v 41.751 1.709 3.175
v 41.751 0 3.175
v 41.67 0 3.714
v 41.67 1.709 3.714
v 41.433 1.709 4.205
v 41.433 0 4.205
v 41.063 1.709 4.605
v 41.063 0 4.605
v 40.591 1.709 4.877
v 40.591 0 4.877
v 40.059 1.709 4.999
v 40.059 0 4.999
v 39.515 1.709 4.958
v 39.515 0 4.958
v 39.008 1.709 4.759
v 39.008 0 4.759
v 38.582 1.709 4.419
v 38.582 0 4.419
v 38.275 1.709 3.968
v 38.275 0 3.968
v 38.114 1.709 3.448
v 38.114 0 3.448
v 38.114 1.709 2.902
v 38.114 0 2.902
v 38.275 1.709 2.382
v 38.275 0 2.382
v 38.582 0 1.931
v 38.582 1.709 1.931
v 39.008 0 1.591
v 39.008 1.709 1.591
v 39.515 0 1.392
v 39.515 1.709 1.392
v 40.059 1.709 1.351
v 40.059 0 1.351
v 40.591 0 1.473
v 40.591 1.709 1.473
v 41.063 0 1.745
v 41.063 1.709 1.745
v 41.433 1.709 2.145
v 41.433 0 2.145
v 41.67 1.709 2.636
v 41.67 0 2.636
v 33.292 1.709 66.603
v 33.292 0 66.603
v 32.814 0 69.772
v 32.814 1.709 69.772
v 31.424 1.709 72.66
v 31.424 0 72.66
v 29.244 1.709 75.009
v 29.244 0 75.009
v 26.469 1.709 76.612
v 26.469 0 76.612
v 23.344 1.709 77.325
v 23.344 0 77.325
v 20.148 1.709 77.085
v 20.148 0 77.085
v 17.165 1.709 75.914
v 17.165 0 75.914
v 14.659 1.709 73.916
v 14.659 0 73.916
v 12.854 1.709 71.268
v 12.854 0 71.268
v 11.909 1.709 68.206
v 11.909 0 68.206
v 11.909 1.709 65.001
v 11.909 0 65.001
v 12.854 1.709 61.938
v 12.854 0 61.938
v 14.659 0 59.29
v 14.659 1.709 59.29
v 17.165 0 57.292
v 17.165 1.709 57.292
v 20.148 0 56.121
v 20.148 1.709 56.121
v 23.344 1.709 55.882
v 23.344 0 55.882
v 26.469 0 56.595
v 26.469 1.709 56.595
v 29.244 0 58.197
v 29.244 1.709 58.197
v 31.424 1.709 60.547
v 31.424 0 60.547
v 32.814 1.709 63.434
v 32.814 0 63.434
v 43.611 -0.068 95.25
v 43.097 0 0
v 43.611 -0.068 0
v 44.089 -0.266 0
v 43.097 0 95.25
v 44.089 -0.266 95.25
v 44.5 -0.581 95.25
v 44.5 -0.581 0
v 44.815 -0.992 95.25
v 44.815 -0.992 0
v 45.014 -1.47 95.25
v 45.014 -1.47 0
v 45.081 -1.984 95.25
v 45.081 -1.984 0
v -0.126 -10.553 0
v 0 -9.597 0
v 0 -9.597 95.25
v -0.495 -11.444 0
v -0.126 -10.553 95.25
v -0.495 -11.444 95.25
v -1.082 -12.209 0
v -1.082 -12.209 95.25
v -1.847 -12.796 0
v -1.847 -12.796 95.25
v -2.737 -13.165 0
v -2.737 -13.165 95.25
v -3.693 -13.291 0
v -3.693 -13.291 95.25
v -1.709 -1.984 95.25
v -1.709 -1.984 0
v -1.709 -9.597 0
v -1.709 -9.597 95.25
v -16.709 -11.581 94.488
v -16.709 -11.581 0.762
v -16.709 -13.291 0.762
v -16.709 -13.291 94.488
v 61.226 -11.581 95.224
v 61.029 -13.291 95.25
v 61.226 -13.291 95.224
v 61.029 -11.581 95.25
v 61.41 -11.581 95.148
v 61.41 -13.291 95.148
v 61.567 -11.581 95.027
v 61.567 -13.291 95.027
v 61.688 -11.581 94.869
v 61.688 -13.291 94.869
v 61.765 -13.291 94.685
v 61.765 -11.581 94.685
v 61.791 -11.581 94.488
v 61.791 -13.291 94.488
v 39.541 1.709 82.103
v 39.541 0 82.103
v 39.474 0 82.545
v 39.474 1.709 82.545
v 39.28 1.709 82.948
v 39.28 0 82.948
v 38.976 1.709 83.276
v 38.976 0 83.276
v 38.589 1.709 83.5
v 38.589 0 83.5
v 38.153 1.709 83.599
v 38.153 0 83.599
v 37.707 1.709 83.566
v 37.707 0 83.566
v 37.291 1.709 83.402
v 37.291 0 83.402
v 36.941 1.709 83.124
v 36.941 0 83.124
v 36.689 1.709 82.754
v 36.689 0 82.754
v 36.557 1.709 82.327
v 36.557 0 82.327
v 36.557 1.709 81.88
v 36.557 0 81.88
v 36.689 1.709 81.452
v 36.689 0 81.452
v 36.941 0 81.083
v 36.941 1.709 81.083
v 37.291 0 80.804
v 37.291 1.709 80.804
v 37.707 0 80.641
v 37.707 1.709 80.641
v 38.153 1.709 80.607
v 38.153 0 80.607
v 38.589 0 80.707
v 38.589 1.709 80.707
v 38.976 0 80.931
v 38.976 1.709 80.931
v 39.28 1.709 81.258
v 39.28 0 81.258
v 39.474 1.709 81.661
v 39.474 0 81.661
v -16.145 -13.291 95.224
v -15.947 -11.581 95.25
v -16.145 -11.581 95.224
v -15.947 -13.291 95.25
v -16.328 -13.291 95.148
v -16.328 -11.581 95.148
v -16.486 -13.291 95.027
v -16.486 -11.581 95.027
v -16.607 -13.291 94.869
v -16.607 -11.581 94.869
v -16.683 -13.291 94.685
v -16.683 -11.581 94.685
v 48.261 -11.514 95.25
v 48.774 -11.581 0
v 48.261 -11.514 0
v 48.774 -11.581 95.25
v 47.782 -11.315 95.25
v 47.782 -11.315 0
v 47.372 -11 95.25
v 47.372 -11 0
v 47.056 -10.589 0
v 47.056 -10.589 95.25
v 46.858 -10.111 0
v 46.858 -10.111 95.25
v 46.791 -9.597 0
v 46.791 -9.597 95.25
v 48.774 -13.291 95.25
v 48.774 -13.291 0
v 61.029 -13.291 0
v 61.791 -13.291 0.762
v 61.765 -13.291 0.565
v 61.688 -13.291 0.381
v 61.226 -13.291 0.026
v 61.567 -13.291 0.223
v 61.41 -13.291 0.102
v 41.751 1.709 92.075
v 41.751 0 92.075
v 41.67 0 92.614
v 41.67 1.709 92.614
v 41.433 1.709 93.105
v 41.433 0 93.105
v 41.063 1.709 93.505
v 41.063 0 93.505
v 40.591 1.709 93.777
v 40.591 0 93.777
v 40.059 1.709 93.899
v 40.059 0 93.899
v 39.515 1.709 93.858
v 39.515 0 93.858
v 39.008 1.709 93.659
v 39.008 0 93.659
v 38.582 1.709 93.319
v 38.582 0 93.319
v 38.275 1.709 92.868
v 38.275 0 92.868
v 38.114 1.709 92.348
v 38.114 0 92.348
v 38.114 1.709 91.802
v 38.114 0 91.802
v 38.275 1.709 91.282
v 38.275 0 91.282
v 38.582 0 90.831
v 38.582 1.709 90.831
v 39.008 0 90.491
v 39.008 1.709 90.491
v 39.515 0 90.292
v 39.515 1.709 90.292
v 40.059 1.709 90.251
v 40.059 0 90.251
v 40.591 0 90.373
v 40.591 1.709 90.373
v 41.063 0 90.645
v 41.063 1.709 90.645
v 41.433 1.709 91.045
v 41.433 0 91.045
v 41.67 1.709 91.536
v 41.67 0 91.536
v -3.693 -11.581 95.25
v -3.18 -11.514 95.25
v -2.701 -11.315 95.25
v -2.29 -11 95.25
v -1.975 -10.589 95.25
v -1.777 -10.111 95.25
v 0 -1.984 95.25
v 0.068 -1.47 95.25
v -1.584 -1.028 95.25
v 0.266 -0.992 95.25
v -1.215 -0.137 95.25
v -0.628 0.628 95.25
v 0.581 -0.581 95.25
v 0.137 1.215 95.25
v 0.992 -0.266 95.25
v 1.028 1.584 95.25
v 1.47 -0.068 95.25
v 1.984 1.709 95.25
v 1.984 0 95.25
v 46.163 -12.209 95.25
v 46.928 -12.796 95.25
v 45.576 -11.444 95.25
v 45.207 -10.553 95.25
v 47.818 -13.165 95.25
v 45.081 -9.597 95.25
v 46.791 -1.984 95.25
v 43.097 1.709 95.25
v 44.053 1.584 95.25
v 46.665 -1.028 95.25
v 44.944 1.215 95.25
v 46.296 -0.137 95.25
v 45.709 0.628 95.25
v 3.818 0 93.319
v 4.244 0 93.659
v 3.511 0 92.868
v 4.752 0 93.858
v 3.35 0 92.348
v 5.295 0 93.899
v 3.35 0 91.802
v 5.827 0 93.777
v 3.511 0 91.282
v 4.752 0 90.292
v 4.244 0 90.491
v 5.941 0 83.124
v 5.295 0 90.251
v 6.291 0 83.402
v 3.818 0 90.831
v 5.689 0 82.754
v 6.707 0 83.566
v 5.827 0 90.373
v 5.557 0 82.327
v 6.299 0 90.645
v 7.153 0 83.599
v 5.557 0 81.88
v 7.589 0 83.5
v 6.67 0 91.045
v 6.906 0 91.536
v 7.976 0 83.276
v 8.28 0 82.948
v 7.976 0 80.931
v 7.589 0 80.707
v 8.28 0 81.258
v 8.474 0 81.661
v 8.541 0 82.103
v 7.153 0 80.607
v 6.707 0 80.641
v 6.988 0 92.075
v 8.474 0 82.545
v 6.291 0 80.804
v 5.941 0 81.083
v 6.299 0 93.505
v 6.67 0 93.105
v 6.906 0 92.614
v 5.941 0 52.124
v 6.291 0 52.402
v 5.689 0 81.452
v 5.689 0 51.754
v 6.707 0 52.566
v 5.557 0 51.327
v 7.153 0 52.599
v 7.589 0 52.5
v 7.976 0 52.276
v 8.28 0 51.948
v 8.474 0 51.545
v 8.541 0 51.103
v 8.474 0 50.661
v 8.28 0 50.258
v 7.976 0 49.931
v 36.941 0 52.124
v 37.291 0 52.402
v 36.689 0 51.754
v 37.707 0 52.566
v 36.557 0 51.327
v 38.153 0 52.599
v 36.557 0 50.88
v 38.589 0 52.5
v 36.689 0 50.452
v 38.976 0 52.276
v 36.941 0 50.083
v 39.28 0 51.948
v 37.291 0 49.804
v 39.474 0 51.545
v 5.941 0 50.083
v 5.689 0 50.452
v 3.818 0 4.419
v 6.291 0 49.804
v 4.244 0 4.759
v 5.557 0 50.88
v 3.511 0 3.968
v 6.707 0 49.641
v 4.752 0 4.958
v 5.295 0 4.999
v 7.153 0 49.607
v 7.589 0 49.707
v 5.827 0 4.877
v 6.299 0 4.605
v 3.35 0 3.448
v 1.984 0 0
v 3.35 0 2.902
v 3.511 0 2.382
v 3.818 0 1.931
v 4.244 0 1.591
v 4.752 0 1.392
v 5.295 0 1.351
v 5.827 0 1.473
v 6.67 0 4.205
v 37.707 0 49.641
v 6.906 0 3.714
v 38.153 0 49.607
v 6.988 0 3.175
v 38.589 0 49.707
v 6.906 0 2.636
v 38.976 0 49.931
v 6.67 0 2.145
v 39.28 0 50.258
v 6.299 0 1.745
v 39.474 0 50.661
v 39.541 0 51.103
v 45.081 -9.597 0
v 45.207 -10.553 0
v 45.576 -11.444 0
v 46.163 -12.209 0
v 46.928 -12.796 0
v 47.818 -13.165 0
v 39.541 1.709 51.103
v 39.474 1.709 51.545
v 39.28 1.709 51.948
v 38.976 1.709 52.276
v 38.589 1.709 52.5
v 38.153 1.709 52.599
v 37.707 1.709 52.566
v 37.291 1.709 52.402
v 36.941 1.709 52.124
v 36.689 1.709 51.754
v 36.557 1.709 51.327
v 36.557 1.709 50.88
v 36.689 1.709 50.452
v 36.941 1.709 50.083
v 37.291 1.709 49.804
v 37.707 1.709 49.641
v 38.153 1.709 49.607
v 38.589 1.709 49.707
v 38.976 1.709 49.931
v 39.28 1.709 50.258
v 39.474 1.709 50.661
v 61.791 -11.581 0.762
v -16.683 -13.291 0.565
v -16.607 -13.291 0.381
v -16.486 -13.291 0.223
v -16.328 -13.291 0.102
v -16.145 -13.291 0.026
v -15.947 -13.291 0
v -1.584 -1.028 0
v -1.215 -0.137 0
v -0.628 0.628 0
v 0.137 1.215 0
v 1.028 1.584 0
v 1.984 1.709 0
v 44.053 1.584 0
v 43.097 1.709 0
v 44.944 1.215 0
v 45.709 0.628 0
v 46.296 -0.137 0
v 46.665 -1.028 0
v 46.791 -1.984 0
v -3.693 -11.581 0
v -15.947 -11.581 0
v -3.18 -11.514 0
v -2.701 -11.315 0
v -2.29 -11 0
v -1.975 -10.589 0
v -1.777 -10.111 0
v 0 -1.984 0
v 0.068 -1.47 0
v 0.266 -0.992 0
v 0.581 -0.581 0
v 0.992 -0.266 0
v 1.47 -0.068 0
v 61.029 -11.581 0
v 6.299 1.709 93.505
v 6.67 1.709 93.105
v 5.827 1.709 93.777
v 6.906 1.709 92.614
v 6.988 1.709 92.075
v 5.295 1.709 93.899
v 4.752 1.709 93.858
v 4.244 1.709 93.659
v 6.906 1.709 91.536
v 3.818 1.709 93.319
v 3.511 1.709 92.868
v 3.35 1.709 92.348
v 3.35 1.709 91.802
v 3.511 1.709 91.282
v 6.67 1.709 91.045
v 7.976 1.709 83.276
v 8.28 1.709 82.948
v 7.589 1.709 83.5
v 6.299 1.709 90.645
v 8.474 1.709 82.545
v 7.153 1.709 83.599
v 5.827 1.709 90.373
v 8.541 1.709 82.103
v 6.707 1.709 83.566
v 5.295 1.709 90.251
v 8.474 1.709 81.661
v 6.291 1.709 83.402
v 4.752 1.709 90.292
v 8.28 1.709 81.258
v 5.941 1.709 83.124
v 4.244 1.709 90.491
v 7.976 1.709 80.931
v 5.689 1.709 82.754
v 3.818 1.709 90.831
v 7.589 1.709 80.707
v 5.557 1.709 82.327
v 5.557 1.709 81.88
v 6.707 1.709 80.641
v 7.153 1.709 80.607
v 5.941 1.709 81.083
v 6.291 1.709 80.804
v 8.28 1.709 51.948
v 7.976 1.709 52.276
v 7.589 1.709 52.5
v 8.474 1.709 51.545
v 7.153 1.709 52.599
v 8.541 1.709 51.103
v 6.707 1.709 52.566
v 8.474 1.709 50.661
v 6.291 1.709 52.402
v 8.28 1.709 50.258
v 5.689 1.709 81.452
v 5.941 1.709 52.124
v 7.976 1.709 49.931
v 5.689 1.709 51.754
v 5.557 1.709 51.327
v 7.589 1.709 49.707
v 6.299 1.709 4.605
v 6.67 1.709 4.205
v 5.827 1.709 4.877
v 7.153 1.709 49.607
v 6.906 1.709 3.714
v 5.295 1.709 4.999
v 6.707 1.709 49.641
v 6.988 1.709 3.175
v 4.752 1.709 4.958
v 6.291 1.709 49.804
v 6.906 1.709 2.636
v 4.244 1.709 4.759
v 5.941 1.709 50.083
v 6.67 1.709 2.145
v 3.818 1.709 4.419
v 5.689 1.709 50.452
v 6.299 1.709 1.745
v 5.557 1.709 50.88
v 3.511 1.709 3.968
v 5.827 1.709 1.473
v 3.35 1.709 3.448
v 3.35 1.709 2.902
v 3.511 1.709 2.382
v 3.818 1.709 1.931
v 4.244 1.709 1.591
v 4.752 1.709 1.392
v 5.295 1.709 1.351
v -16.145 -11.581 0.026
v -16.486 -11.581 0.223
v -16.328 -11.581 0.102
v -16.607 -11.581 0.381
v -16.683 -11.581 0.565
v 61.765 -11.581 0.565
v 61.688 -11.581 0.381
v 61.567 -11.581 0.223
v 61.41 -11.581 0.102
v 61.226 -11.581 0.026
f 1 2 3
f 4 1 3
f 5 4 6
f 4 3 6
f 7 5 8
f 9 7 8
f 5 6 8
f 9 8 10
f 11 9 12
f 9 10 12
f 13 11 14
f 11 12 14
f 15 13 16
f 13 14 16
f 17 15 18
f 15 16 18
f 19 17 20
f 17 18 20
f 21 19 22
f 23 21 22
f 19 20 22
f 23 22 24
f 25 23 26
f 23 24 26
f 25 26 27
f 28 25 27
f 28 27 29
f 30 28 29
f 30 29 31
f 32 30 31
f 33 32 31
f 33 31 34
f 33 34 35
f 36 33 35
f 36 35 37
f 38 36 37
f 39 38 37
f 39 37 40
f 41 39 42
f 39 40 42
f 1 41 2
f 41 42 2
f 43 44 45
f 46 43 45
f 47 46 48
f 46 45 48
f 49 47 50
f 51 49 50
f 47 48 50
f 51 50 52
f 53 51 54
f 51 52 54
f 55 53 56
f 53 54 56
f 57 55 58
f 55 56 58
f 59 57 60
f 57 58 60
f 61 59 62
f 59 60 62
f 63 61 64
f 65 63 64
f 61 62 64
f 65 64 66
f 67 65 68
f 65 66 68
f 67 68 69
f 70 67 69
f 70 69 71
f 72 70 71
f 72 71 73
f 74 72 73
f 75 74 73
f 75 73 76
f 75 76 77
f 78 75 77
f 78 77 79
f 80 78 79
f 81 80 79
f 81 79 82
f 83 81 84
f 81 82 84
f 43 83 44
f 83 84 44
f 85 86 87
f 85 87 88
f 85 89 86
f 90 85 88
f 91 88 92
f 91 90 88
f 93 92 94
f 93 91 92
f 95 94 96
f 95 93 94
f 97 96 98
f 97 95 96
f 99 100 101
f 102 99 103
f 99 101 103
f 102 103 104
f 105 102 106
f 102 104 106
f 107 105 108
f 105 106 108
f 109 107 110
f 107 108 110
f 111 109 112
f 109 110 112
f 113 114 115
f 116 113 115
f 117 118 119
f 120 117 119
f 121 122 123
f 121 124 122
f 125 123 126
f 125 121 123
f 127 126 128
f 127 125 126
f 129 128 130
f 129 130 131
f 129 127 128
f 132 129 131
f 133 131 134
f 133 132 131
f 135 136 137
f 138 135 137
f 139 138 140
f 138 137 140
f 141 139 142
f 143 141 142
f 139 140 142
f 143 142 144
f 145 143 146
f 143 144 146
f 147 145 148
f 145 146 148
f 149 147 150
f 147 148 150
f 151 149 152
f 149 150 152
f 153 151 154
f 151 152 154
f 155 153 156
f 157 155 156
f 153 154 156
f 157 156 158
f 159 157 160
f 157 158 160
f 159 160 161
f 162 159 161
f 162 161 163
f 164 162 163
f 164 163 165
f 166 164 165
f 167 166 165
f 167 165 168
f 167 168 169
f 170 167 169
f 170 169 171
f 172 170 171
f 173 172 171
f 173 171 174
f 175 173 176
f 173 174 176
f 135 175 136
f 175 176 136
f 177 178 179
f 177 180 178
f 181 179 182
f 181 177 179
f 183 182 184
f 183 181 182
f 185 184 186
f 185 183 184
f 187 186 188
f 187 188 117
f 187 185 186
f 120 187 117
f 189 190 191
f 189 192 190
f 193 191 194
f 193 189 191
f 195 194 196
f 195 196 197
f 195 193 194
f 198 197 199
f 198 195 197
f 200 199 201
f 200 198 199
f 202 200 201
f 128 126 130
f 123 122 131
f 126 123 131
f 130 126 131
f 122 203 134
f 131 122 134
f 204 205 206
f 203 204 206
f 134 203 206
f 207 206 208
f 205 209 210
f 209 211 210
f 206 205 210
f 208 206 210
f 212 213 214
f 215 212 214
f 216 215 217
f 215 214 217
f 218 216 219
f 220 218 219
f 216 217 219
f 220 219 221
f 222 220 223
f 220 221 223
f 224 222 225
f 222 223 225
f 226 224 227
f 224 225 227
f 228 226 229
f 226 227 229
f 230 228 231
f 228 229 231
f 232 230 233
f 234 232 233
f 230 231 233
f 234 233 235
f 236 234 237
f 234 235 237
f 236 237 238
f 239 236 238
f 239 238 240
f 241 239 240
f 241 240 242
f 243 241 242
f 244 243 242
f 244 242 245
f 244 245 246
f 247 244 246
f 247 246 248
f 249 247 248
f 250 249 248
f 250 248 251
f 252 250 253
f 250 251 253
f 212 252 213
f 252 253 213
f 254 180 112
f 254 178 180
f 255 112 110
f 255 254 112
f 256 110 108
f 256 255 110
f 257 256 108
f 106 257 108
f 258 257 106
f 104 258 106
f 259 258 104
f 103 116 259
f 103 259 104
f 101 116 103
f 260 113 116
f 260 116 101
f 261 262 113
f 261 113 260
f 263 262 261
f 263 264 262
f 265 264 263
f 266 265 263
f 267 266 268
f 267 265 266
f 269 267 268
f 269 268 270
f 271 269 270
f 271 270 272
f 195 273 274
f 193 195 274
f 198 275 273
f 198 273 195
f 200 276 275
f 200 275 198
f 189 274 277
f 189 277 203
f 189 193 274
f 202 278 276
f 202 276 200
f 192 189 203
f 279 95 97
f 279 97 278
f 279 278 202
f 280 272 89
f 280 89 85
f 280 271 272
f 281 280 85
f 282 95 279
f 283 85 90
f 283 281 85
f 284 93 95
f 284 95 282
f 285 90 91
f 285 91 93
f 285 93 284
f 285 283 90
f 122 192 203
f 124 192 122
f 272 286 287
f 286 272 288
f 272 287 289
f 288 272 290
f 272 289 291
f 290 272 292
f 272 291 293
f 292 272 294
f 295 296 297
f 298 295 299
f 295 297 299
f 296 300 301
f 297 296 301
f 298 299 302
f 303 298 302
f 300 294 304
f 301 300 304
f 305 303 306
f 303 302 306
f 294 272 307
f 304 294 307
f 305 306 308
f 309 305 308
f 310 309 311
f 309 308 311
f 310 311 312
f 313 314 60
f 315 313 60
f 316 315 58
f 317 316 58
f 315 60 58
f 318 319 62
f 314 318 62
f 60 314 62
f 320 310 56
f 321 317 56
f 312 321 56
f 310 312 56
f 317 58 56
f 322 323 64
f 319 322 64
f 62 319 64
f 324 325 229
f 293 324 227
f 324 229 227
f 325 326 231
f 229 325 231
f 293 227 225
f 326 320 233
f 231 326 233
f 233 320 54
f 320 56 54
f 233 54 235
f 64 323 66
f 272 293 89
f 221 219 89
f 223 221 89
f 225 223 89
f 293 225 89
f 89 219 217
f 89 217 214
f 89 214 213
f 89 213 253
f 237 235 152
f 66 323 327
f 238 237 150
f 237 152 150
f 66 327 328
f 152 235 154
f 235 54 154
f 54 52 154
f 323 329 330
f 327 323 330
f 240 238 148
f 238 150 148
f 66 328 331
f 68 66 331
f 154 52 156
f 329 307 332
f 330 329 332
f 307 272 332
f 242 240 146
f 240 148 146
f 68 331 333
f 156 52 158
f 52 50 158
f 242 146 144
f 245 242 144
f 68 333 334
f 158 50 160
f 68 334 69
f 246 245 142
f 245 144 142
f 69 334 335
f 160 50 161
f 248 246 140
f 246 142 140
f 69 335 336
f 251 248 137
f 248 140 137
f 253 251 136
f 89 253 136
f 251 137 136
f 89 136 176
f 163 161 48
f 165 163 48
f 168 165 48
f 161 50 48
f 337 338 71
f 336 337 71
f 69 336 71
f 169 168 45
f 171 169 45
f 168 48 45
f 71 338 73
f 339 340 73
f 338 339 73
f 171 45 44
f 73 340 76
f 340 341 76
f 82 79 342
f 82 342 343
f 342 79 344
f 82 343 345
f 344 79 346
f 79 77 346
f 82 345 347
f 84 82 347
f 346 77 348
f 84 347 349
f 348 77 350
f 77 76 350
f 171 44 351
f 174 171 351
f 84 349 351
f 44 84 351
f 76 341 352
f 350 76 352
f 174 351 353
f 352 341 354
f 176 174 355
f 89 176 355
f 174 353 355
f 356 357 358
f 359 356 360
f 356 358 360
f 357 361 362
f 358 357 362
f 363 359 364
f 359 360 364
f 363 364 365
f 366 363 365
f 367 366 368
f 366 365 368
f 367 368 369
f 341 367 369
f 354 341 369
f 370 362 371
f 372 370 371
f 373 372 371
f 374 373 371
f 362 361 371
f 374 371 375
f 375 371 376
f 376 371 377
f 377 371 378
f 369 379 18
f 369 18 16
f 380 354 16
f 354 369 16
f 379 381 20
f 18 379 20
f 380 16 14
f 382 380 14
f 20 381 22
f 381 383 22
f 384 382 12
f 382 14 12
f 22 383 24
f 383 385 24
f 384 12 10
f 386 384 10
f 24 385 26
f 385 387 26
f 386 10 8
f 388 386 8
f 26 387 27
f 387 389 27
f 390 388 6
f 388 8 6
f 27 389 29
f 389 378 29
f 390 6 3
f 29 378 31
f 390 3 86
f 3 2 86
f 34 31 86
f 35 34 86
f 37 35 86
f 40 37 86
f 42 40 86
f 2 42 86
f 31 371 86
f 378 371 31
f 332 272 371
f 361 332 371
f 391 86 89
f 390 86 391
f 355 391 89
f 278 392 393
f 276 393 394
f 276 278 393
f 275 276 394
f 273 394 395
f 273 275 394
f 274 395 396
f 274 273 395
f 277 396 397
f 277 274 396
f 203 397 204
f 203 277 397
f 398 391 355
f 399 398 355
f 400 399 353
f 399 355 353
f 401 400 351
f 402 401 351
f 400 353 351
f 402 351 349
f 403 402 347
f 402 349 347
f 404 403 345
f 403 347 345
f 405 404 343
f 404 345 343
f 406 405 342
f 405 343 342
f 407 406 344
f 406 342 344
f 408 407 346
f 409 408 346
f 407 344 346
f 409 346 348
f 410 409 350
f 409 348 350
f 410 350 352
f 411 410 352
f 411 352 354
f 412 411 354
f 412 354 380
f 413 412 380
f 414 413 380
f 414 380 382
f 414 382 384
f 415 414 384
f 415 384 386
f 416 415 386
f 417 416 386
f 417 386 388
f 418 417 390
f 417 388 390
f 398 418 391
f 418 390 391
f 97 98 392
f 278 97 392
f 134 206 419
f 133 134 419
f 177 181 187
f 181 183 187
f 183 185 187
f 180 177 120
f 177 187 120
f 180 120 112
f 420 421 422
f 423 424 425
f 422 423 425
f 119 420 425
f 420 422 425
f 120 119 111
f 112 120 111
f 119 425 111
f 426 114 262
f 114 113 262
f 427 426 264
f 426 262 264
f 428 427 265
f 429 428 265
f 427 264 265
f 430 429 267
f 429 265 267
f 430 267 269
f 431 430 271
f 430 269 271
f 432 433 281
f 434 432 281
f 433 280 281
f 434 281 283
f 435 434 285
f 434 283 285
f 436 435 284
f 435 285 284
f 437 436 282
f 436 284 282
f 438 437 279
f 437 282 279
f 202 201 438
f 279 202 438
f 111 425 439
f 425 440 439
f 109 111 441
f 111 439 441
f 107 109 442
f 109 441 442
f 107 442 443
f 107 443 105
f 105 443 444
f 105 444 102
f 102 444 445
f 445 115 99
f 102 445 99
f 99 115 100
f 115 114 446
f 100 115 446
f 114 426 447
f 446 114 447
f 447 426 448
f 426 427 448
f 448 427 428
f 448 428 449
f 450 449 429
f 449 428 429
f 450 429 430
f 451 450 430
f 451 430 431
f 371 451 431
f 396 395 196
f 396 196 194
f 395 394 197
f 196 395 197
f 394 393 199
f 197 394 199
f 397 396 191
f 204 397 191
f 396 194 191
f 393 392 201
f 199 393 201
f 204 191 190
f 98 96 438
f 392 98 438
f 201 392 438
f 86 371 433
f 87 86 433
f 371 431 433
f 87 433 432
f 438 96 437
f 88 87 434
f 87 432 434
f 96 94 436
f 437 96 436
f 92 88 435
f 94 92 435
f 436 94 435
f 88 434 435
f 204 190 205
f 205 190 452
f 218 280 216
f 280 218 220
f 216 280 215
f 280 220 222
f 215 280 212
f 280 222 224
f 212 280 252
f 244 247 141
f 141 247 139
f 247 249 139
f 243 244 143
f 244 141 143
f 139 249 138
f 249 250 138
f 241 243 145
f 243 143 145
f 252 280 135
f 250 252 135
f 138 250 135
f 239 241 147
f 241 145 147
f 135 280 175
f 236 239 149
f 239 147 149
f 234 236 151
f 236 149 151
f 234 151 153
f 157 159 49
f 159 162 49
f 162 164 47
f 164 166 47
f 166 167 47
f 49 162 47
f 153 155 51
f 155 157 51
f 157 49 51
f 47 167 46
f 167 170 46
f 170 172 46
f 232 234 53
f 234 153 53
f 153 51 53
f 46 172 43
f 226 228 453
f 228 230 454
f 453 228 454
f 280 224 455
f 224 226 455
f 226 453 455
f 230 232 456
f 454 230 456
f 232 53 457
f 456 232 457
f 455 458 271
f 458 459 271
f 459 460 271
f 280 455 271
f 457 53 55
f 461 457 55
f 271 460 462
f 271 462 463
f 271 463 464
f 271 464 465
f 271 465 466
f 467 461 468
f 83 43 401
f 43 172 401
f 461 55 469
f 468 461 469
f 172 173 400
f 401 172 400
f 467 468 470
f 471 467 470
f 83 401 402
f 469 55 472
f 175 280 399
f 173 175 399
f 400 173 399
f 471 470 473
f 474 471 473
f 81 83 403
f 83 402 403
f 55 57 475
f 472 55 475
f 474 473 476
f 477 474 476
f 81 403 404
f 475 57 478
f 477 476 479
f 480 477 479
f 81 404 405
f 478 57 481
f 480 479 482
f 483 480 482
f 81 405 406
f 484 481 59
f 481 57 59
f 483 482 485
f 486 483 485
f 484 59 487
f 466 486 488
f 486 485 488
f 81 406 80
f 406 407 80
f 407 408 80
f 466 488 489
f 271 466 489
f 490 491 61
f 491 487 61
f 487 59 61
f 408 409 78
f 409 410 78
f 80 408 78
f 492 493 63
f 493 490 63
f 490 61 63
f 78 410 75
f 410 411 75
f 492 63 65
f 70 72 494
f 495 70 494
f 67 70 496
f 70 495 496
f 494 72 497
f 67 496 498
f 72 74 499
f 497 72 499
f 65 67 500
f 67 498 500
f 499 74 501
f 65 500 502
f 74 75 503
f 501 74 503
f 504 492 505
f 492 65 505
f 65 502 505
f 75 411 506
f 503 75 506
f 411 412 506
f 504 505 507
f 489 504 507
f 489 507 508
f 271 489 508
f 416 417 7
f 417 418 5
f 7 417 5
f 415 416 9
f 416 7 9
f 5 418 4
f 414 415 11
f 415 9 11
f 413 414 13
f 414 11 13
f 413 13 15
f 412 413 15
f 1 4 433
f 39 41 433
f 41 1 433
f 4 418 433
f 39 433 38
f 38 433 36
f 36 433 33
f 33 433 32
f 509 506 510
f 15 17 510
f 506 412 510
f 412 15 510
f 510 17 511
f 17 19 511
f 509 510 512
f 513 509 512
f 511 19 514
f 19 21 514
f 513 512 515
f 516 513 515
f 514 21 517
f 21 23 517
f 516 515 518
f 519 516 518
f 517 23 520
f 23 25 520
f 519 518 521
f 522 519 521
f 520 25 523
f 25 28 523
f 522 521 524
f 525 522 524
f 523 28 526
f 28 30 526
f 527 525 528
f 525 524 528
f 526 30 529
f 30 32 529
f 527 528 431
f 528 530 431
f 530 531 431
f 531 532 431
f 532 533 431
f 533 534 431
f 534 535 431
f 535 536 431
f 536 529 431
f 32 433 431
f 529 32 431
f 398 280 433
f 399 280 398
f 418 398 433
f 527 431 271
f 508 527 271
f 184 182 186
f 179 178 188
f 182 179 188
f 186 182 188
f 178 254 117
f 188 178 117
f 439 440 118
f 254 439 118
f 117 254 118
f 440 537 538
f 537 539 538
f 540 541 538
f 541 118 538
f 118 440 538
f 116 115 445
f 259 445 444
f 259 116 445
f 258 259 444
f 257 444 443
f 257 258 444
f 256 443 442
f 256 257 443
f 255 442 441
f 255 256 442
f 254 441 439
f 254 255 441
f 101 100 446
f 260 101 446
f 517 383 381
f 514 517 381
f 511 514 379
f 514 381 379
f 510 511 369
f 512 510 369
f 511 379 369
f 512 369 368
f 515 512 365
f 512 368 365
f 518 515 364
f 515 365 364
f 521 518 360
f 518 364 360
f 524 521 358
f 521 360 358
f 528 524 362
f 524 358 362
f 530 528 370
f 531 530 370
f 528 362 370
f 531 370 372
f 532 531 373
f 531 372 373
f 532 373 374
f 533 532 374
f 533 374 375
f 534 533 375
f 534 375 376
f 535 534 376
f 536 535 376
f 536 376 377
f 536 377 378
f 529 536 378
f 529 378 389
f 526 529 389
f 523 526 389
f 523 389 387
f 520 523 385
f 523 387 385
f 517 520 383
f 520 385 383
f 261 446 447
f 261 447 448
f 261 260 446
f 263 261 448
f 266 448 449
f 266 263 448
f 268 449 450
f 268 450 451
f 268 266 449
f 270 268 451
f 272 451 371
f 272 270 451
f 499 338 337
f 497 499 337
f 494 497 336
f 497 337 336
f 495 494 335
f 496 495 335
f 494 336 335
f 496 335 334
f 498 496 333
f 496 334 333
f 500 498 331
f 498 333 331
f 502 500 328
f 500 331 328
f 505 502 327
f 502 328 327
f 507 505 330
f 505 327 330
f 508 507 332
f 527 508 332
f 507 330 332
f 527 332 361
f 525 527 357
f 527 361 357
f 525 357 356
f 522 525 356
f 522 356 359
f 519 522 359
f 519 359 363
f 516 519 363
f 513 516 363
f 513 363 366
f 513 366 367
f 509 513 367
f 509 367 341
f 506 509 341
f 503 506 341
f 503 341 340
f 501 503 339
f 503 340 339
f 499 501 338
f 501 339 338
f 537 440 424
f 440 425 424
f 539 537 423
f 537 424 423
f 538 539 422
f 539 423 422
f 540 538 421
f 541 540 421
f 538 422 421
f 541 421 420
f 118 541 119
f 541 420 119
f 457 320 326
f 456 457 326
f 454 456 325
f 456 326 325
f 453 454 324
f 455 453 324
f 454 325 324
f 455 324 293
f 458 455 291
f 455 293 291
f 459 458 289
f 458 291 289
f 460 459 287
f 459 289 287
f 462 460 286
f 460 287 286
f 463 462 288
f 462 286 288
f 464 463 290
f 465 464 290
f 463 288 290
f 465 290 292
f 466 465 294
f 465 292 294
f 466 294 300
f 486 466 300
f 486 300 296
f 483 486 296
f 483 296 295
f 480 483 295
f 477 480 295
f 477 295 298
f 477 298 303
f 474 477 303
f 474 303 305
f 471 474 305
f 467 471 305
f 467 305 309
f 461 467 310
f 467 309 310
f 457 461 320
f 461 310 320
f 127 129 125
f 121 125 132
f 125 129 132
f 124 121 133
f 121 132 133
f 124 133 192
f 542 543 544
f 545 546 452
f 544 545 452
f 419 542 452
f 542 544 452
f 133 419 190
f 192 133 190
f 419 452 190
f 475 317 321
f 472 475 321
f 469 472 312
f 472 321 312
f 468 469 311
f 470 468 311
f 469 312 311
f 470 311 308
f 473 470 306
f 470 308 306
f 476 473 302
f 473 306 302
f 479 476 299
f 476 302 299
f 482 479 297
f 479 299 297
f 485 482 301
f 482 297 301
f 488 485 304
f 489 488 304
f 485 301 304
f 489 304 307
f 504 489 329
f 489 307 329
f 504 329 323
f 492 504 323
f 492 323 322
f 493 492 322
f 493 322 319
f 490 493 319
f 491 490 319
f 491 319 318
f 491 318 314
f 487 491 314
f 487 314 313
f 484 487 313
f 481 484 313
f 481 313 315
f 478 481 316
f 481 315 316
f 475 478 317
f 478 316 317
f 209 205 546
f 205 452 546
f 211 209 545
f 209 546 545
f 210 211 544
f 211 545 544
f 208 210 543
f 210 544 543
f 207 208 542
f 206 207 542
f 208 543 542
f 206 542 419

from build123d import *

# Parameters (mm, degrees)
F1_DEPTH = 95.25
F2_R     = 1.98374
F3_R     = 3.69316
F4_R     = 0.762
F5_R     = 1.8288
F6_DEPTH = 1.70942
F7_R     = 10.751496
F7_R_2   = 1.5
F8_DEPTH = 1.70942


with BuildPart() as f1:
    # F0 (on Top) → F1 (new body)
    with BuildSketch(Plane.XY):
        Polygon((0, -13.29058), (0, 0), (45.08116, 0), (45.08116, -13.29058), (61.79058, -13.29058), (61.79058, -11.58116), (46.79058, -11.58116), (46.79058, 1.70942), (-1.70942, 1.70942), (-1.70942, -11.58116), (-16.70942, -11.58116), (-16.70942, -13.29058), align=None)
    extrude(amount=F1_DEPTH)

    # F2
    f2_edges = [f1.edges().sort_by_distance(p)[0] for p in [
        (0, 0, 47.625),
        (-1.70942, -11.58116, 47.625),
        (45.08116, 0, 47.625),
        (46.79058, -11.58116, 47.625),
    ]]
    fillet(f2_edges, radius=F2_R)

    # F3
    f3_edges = [f1.edges().sort_by_distance(p)[0] for p in [
        (0, -13.29058, 47.625),
        (-1.70942, 1.70942, 47.625),
        (46.79058, 1.70942, 47.625),
        (45.08116, -13.29058, 47.625),
    ]]
    fillet(f3_edges, radius=F3_R)

    # F4
    f4_edges = [f1.edges().sort_by_distance(p)[0] for p in [
        (-16.70942, -12.43587, 0),
        (-16.70942, -12.43587, 95.25),
        (61.79058, -12.43587, 0),
        (61.79058, -12.43587, 95.25),
    ]]
    fillet(f4_edges, radius=F4_R)

    # F5 (on face) → F6 (cut, through all)
    with BuildSketch(Plane.XZ):
        with Locations((5.15874, 92.075)):
            Circle(F5_R)
        with Locations((5.15874, 3.175)):
            Circle(F5_R)
        with Locations((39.92242, 92.075)):
            Circle(F5_R)
        with Locations((39.92242, 3.175)):
            Circle(F5_R)
    extrude(amount=-F6_DEPTH, mode=Mode.SUBTRACT)

    # F7 (on face) → F8 (cut, through all)
    with BuildSketch(Plane.XZ):
        with Locations((22.54058, 66.603258)):
            Circle(F7_R)
        with Locations((38.040574, 82.103252)):
            Circle(F7_R_2)
        with Locations((38.040574, 51.103263)):
            Circle(F7_R_2)
        with Locations((7.040586, 51.103263)):
            Circle(F7_R_2)
        with Locations((7.040586, 82.103252)):
            Circle(F7_R_2)
    extrude(amount=-F8_DEPTH, mode=Mode.SUBTRACT)


solid = f1.part
